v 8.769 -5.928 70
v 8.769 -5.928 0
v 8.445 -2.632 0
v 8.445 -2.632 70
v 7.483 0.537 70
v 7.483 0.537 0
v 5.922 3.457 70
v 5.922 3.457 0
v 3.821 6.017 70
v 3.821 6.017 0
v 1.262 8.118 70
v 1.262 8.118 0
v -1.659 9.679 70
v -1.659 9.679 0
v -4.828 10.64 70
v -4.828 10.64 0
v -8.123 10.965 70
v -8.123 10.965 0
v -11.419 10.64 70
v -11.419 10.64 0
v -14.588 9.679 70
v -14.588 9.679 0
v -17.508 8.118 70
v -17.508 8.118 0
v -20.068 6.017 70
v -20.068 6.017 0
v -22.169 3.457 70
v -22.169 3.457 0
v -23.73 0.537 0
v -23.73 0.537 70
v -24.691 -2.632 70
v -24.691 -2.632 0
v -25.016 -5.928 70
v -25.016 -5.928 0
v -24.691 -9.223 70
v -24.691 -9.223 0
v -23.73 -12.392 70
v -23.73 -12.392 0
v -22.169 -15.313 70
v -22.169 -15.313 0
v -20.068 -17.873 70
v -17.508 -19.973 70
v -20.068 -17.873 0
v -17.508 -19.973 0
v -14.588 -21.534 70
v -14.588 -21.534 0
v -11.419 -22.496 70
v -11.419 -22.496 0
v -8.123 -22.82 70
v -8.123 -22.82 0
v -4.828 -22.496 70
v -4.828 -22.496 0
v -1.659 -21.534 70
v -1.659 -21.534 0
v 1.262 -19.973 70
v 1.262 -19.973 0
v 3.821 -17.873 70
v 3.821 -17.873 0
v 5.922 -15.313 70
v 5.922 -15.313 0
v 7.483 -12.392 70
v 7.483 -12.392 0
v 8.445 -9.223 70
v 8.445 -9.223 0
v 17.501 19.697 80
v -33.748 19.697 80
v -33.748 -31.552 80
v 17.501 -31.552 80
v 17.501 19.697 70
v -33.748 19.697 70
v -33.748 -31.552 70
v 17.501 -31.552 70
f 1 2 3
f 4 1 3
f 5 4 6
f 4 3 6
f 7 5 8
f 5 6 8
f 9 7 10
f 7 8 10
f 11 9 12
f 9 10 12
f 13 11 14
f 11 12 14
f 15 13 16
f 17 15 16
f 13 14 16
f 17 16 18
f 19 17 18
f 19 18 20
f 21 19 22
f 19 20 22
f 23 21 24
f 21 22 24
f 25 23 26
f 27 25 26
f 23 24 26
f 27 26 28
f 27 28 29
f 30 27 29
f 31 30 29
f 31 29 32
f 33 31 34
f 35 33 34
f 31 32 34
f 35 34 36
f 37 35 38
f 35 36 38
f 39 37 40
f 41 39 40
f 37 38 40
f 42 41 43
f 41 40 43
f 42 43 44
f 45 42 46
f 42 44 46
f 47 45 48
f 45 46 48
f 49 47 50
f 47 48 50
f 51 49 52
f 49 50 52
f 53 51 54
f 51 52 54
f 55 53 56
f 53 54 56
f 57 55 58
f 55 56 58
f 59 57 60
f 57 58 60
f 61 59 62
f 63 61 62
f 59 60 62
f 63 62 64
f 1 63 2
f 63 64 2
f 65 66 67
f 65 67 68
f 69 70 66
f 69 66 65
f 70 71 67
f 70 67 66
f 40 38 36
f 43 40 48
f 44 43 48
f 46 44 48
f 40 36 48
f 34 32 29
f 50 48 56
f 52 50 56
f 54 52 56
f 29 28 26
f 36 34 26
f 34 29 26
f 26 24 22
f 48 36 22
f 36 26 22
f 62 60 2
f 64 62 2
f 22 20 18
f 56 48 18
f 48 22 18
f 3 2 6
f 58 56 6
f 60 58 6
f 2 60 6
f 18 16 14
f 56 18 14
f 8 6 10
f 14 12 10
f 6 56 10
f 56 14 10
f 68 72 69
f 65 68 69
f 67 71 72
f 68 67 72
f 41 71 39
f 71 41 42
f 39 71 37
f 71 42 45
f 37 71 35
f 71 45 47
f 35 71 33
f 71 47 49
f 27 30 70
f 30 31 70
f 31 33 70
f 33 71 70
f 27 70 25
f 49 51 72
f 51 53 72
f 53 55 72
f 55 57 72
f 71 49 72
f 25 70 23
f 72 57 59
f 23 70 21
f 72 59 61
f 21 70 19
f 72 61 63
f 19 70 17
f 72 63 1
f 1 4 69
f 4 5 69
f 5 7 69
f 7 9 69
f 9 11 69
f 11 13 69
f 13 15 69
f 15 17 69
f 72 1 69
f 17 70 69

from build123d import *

# Parameters (mm, degrees)
SKETCH1_R           = 16.892448346
BOSS_EXTRUDE1_DEPTH = 70
SKETCH2_W           = 51.249127752
SKETCH2_H           = 51.249127751
BOSS_EXTRUDE2_DEPTH = 10


with BuildPart() as part:
    # Sketch1 → Boss-Extrude1 (new body)
    with BuildSketch(Plane.XY):
        with Locations((-8.123318292, -5.927826862)):
            Circle(SKETCH1_R)
    extrude(amount=BOSS_EXTRUDE1_DEPTH)

    # Sketch2 → Boss-Extrude2 (add)
    with BuildSketch(Plane.XY.offset(70)):
        with Locations((-8.123318292, -5.927826862)):
            Rectangle(SKETCH2_W, SKETCH2_H)
    extrude(amount=BOSS_EXTRUDE2_DEPTH)


solid = part.part
